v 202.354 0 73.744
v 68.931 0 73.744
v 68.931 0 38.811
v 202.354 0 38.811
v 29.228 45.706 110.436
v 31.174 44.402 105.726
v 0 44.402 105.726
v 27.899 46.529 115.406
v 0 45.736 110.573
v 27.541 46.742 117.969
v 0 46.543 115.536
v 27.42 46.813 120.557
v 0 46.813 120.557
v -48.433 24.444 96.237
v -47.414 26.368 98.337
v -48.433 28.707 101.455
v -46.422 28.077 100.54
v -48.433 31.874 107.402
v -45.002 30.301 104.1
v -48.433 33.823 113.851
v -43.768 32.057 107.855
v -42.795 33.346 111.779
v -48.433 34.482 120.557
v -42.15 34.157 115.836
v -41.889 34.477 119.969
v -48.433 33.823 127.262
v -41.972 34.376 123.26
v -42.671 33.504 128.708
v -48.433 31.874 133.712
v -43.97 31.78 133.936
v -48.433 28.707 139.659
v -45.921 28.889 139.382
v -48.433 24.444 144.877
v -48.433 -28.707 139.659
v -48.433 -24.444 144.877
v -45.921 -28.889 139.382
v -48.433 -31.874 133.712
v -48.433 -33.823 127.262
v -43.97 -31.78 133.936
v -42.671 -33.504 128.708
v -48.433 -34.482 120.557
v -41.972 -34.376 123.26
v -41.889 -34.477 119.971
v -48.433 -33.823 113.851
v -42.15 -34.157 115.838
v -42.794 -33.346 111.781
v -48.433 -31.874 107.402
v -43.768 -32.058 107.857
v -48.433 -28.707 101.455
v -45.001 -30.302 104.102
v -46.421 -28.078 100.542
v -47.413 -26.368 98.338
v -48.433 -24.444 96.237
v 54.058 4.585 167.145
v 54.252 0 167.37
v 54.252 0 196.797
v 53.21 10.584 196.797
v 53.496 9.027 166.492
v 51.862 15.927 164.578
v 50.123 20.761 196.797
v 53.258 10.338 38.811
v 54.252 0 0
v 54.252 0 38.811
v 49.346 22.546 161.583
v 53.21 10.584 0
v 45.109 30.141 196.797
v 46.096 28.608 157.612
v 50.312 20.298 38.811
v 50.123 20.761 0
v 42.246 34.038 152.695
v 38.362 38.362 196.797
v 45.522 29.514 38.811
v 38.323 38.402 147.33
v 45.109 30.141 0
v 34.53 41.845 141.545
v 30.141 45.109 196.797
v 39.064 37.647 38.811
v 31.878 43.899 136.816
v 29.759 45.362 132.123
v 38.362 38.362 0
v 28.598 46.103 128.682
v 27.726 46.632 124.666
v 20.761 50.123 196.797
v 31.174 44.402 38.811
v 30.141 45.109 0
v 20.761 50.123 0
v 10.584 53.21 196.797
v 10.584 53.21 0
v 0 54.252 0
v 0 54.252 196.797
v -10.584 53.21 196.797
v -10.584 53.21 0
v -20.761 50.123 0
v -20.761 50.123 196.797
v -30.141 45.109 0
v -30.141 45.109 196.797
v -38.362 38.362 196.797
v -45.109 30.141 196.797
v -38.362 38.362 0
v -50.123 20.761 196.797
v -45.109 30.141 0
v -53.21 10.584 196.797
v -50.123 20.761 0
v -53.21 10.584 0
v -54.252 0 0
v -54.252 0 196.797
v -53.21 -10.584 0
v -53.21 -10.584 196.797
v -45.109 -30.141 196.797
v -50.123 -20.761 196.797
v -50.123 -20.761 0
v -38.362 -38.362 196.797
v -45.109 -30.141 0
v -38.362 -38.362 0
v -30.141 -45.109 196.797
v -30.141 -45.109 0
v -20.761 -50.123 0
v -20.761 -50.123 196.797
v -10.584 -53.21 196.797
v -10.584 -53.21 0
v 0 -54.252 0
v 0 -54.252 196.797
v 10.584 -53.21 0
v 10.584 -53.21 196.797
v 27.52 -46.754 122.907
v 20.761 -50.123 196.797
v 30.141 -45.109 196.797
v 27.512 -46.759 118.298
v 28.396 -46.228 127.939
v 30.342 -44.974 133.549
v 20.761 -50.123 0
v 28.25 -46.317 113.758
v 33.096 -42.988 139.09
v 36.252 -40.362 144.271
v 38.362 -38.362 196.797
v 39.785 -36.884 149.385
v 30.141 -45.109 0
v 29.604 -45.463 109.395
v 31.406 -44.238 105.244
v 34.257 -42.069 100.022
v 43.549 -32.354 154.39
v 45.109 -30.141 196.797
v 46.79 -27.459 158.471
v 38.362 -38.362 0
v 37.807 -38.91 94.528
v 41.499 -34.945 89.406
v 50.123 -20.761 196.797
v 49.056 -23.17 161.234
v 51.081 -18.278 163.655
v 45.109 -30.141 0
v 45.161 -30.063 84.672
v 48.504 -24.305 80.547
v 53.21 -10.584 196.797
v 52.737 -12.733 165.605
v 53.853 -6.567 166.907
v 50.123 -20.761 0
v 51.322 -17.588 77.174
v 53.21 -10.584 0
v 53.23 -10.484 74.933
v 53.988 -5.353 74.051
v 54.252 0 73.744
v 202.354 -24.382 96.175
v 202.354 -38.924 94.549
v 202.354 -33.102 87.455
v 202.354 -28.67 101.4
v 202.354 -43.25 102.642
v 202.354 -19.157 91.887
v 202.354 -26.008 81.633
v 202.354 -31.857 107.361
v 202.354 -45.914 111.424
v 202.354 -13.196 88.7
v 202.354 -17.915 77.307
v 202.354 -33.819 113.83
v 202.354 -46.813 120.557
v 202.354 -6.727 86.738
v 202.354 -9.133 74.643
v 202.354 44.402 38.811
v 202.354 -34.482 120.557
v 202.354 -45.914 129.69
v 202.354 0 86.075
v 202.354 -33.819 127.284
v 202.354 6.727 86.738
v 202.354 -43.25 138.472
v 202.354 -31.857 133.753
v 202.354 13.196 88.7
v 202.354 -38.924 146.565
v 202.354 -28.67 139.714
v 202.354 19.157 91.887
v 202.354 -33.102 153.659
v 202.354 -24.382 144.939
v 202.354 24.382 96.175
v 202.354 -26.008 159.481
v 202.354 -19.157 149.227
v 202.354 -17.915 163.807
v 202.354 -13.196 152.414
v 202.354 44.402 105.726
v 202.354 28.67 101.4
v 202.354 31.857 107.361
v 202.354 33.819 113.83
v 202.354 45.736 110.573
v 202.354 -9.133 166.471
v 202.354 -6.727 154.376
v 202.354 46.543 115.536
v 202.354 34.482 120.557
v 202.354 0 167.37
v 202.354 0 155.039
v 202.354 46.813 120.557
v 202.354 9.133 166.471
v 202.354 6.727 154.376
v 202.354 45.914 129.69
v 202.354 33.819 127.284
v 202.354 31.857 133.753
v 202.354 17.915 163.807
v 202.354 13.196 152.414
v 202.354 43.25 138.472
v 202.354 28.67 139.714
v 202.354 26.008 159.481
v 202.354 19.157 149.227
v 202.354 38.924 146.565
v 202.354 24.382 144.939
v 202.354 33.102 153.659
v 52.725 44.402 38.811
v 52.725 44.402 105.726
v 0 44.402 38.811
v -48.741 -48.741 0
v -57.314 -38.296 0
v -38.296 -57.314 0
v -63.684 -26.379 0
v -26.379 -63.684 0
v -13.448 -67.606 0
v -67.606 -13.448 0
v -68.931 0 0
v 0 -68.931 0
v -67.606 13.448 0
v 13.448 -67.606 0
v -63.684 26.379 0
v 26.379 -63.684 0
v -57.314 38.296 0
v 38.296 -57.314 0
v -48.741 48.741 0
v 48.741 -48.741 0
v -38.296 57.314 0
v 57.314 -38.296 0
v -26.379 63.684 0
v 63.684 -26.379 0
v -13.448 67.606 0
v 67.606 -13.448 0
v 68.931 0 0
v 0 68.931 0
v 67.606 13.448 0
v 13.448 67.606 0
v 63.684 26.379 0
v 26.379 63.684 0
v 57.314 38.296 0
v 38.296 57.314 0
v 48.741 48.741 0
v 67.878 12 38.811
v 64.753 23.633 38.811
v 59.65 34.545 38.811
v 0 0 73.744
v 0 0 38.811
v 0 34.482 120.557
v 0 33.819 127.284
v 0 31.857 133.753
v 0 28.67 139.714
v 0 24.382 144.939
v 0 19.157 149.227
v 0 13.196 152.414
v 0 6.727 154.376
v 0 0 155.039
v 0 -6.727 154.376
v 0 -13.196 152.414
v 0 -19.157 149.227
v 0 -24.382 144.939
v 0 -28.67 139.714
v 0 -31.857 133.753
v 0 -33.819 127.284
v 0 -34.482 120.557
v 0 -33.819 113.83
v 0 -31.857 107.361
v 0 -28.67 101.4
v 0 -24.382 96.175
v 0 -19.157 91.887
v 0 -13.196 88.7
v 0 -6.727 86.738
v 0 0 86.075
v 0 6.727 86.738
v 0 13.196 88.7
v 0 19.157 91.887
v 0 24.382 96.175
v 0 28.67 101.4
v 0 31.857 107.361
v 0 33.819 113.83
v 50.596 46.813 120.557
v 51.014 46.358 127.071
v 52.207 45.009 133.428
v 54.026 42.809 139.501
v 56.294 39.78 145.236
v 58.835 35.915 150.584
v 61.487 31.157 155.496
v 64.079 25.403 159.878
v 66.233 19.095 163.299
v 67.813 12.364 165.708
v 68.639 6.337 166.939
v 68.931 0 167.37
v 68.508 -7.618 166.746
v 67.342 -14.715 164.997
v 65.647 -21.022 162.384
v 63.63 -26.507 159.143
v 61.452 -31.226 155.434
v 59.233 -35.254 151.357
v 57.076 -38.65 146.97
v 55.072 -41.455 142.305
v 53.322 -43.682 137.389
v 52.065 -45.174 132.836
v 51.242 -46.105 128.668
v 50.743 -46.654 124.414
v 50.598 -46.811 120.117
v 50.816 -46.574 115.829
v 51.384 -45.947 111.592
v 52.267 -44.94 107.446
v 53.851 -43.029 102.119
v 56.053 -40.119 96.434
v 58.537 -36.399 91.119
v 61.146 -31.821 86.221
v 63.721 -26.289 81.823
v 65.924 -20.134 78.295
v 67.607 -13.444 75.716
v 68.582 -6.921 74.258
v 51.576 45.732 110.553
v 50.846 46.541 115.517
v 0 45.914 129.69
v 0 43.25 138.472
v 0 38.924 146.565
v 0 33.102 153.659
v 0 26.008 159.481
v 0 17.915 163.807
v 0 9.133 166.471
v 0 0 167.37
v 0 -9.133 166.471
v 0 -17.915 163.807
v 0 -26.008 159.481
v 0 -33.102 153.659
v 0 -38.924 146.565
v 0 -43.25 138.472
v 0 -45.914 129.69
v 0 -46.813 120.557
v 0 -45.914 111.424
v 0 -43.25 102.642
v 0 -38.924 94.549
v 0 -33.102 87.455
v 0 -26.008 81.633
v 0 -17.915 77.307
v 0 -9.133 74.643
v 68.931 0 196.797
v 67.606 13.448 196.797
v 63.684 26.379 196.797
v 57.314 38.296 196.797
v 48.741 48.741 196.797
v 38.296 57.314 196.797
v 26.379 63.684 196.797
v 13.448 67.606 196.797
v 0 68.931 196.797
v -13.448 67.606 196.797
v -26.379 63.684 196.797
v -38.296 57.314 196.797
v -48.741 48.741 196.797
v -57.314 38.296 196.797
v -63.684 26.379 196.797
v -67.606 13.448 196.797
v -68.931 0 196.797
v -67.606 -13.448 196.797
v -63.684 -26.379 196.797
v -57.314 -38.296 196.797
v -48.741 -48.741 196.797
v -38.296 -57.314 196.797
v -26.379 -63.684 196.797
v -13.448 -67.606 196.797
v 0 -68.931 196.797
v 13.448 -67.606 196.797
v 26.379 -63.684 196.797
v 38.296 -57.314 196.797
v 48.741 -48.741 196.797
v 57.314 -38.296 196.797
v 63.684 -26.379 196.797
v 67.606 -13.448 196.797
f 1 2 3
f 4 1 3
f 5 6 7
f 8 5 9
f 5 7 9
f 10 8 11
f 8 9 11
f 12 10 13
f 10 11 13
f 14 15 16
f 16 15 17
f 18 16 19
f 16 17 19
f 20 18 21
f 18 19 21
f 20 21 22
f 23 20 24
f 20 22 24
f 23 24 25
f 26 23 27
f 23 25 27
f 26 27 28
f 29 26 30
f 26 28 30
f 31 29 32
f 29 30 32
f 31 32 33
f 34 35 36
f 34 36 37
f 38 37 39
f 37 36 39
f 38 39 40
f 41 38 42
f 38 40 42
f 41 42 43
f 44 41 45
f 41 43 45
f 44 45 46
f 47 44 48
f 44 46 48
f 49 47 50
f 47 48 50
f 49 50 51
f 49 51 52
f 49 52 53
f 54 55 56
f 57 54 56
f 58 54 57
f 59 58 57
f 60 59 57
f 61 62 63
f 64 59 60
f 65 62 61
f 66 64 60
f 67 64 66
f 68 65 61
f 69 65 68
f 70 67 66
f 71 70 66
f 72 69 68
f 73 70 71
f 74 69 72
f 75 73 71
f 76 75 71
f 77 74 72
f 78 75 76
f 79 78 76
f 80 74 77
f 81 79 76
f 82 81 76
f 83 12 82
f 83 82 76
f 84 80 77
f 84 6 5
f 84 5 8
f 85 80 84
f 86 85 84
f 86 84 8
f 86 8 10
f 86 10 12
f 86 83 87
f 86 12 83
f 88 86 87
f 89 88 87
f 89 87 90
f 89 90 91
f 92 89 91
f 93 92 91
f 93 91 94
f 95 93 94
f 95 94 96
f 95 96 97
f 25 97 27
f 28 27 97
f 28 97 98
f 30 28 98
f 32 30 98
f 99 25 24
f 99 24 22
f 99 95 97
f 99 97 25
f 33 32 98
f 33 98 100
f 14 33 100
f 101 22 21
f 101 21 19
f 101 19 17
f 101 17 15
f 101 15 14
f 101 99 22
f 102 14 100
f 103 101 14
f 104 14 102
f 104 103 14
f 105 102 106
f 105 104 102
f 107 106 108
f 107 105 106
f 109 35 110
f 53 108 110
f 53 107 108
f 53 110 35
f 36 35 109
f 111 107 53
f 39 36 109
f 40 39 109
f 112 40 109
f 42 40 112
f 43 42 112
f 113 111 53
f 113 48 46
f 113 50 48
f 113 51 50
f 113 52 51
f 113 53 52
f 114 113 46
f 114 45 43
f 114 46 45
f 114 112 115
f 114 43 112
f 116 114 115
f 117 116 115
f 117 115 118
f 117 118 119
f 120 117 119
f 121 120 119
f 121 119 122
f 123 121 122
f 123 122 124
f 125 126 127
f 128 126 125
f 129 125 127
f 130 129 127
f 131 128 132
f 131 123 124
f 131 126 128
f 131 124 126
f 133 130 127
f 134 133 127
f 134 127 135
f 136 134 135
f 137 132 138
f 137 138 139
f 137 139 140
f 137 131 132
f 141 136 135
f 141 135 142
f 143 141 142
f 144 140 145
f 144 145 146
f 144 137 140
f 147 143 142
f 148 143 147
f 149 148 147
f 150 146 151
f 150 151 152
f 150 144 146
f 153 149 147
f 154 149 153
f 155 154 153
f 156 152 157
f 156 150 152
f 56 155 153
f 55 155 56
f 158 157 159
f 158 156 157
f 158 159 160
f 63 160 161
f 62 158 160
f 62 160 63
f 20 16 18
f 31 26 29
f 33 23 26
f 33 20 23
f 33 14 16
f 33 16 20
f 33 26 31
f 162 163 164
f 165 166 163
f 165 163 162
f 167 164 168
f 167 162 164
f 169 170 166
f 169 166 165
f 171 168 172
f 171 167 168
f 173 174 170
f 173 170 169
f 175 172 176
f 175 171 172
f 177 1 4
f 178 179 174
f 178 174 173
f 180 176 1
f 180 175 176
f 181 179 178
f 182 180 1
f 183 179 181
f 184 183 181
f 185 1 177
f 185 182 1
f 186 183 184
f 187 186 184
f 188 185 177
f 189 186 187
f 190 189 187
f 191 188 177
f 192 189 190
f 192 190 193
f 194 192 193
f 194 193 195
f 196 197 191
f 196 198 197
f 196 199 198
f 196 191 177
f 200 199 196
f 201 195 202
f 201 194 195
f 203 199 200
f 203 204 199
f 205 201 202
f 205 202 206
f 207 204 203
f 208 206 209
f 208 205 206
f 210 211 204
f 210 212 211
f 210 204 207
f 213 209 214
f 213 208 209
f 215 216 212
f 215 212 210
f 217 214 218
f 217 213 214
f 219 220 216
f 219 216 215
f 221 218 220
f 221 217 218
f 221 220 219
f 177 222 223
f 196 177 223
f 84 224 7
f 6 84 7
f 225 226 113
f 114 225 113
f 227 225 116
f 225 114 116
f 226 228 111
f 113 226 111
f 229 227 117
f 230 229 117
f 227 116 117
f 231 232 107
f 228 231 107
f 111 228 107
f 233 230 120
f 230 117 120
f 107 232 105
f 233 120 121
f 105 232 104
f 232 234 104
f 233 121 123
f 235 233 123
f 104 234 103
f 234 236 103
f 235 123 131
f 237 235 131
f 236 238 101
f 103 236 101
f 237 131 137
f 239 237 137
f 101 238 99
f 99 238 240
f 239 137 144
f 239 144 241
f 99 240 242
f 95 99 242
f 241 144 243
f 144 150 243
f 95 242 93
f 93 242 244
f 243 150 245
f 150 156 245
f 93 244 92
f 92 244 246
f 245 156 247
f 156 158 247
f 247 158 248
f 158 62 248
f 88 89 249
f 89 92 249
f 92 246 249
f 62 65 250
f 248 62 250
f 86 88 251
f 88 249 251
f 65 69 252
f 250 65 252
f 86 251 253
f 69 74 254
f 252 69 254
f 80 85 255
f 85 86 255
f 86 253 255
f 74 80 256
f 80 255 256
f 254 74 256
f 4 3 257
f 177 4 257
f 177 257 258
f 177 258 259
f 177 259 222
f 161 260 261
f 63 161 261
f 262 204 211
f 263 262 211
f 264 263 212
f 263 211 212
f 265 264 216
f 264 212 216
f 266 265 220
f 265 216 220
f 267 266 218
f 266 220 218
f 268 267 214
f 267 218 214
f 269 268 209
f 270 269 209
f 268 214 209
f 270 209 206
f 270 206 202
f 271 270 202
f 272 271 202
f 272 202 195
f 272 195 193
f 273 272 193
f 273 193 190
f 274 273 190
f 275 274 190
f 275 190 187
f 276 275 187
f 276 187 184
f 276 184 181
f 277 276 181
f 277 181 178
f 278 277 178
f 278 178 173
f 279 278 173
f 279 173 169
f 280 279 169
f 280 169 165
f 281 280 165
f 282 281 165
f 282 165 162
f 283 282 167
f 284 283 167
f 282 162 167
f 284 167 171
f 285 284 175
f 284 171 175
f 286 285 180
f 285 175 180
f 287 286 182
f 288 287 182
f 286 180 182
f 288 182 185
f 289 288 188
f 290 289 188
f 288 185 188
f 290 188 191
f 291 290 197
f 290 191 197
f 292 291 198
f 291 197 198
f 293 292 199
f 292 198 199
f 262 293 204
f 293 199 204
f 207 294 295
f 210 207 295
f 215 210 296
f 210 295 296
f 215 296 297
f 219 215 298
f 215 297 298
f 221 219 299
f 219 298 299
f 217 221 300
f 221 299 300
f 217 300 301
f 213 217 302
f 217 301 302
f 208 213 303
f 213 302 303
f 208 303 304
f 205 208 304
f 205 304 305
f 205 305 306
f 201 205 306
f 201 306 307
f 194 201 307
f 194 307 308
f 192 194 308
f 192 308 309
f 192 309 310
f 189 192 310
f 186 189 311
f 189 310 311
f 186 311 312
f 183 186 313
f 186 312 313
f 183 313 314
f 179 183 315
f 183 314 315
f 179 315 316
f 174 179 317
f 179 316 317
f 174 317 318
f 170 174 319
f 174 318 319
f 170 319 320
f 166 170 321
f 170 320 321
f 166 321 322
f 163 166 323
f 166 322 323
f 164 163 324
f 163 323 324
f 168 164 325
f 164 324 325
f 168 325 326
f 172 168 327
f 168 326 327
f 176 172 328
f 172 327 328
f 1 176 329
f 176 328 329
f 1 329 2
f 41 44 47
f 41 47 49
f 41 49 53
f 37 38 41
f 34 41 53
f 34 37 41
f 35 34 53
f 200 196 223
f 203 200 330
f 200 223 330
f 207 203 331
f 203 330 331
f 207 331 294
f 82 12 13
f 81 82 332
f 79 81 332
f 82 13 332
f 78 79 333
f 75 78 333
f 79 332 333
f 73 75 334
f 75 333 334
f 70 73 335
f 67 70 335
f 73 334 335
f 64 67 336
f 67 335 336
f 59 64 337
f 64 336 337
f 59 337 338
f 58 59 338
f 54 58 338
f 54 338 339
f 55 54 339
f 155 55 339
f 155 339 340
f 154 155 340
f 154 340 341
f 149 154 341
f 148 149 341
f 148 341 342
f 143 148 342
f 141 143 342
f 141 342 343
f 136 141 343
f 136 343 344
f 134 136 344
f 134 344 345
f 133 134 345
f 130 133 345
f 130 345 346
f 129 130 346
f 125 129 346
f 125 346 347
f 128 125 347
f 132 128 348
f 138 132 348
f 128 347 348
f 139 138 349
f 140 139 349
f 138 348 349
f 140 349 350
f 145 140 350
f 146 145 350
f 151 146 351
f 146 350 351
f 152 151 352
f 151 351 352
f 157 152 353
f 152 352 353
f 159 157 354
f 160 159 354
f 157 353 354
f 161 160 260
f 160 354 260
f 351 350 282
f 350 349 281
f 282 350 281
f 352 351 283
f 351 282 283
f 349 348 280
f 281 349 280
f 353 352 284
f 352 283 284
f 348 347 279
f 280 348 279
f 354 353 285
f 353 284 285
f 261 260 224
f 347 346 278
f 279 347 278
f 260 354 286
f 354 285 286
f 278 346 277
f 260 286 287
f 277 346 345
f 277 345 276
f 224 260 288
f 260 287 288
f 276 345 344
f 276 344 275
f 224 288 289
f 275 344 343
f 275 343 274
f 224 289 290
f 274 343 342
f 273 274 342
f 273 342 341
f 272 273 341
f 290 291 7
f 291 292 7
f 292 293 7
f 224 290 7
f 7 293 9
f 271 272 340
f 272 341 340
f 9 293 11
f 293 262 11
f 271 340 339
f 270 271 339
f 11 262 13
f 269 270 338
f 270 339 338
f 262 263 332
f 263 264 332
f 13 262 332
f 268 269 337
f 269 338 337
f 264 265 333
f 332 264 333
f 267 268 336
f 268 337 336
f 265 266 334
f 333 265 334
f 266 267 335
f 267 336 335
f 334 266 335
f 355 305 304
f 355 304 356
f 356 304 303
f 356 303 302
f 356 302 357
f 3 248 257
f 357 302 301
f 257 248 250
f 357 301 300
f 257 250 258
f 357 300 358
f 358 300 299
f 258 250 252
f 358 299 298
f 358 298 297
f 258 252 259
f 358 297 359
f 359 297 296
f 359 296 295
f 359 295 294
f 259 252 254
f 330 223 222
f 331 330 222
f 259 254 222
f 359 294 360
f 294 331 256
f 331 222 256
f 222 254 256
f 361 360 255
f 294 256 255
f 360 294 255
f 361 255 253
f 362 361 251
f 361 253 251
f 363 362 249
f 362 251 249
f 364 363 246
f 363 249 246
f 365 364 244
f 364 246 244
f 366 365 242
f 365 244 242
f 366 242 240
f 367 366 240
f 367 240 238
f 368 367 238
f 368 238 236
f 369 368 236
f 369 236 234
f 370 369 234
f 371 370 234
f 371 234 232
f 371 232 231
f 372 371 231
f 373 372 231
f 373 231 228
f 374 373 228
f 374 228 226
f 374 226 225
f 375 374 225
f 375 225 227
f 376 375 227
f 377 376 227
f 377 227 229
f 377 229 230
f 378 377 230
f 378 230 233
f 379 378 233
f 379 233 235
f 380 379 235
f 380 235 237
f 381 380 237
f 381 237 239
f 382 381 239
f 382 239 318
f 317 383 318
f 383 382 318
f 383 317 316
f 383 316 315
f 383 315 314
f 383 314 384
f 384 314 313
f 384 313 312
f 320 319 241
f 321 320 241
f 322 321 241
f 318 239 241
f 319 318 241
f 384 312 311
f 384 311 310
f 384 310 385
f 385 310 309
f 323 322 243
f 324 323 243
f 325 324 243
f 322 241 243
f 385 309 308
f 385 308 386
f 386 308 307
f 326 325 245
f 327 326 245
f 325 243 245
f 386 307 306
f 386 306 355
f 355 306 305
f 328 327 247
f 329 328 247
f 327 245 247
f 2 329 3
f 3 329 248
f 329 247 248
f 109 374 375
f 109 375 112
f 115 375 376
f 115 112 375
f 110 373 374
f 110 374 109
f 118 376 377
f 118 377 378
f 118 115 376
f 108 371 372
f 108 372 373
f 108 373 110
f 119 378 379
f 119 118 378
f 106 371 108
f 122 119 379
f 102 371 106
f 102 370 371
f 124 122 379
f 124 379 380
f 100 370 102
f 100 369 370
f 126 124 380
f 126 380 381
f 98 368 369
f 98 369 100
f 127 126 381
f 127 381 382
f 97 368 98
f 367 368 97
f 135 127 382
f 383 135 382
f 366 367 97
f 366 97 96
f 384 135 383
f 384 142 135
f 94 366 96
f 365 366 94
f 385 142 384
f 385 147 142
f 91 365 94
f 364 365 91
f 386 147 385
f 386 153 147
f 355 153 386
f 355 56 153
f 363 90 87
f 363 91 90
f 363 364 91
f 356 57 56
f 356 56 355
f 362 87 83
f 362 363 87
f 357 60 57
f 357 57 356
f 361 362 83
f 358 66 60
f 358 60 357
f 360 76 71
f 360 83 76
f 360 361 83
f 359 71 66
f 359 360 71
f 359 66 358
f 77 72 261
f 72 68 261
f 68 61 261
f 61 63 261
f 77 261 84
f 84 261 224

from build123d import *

# Parameters (mm, degrees)
F0_R     = 68.9306074925
F0_R_2   = 54.2522801739
F1_DEPTH = 196.7971026897
F3_DEPTH = 202.3541331291
F4_R     = 34.4816495033
F5_DEPTH = 250.7874369621


with BuildPart() as f1:
    # F0 (on Top) → F1 (new body)
    with BuildSketch(Plane.XY):
        Circle(F0_R)
        Circle(F0_R_2, mode=Mode.SUBTRACT)
    extrude(amount=F1_DEPTH)

    # F2 (on Right) → F3 (join)
    with BuildSketch(Plane.YZ):
        with BuildLine():
            Line((0, 73.7437401834), (0, 120.5569505692))
            Line((0, 120.5569505692), (44.4016605616, 120.5569505692))
            Line((44.4016605616, 120.5569505692), (44.4016605616, 105.725591697))
            ThreePointArc((44.4016605616, 105.725591697), (46.2063899475, 113.043882312), (46.8132103857, 120.5569505692))
            ThreePointArc((46.8132103857, 120.5569505692), (-33.1019385129, 153.658889082), (0, 73.7437401834))
        make_face()
        with BuildLine():
            Line((44.4016605616, 120.5569505692), (0, 120.5569505692))
            Line((0, 120.5569505692), (0, 73.7437401834))
            ThreePointArc((0, 73.7437401834), (27.3603101539, 82.5715573909), (44.4016605616, 105.725591697))
            Line((44.4016605616, 105.725591697), (44.4016605616, 120.5569505692))
        make_face()
        with BuildLine():
            ThreePointArc((44.4016605616, 105.725591697), (27.3603101539, 82.5715573909), (0, 73.7437401834))
            Line((0, 73.7437401834), (0, 38.8107895851))
            Line((0, 38.8107895851), (44.4016605616, 38.8107895851))
            Line((44.4016605616, 38.8107895851), (44.4016605616, 105.725591697))
        make_face()
    extrude(amount=F3_DEPTH)

    # F4 (on face) → F5 (cut)
    with BuildSketch(Plane.YZ.offset(202.3541331291)):
        with Locations((0, 120.5569505692)):
            Circle(F4_R)
    extrude(amount=-F5_DEPTH, mode=Mode.SUBTRACT)


solid = f1.part
